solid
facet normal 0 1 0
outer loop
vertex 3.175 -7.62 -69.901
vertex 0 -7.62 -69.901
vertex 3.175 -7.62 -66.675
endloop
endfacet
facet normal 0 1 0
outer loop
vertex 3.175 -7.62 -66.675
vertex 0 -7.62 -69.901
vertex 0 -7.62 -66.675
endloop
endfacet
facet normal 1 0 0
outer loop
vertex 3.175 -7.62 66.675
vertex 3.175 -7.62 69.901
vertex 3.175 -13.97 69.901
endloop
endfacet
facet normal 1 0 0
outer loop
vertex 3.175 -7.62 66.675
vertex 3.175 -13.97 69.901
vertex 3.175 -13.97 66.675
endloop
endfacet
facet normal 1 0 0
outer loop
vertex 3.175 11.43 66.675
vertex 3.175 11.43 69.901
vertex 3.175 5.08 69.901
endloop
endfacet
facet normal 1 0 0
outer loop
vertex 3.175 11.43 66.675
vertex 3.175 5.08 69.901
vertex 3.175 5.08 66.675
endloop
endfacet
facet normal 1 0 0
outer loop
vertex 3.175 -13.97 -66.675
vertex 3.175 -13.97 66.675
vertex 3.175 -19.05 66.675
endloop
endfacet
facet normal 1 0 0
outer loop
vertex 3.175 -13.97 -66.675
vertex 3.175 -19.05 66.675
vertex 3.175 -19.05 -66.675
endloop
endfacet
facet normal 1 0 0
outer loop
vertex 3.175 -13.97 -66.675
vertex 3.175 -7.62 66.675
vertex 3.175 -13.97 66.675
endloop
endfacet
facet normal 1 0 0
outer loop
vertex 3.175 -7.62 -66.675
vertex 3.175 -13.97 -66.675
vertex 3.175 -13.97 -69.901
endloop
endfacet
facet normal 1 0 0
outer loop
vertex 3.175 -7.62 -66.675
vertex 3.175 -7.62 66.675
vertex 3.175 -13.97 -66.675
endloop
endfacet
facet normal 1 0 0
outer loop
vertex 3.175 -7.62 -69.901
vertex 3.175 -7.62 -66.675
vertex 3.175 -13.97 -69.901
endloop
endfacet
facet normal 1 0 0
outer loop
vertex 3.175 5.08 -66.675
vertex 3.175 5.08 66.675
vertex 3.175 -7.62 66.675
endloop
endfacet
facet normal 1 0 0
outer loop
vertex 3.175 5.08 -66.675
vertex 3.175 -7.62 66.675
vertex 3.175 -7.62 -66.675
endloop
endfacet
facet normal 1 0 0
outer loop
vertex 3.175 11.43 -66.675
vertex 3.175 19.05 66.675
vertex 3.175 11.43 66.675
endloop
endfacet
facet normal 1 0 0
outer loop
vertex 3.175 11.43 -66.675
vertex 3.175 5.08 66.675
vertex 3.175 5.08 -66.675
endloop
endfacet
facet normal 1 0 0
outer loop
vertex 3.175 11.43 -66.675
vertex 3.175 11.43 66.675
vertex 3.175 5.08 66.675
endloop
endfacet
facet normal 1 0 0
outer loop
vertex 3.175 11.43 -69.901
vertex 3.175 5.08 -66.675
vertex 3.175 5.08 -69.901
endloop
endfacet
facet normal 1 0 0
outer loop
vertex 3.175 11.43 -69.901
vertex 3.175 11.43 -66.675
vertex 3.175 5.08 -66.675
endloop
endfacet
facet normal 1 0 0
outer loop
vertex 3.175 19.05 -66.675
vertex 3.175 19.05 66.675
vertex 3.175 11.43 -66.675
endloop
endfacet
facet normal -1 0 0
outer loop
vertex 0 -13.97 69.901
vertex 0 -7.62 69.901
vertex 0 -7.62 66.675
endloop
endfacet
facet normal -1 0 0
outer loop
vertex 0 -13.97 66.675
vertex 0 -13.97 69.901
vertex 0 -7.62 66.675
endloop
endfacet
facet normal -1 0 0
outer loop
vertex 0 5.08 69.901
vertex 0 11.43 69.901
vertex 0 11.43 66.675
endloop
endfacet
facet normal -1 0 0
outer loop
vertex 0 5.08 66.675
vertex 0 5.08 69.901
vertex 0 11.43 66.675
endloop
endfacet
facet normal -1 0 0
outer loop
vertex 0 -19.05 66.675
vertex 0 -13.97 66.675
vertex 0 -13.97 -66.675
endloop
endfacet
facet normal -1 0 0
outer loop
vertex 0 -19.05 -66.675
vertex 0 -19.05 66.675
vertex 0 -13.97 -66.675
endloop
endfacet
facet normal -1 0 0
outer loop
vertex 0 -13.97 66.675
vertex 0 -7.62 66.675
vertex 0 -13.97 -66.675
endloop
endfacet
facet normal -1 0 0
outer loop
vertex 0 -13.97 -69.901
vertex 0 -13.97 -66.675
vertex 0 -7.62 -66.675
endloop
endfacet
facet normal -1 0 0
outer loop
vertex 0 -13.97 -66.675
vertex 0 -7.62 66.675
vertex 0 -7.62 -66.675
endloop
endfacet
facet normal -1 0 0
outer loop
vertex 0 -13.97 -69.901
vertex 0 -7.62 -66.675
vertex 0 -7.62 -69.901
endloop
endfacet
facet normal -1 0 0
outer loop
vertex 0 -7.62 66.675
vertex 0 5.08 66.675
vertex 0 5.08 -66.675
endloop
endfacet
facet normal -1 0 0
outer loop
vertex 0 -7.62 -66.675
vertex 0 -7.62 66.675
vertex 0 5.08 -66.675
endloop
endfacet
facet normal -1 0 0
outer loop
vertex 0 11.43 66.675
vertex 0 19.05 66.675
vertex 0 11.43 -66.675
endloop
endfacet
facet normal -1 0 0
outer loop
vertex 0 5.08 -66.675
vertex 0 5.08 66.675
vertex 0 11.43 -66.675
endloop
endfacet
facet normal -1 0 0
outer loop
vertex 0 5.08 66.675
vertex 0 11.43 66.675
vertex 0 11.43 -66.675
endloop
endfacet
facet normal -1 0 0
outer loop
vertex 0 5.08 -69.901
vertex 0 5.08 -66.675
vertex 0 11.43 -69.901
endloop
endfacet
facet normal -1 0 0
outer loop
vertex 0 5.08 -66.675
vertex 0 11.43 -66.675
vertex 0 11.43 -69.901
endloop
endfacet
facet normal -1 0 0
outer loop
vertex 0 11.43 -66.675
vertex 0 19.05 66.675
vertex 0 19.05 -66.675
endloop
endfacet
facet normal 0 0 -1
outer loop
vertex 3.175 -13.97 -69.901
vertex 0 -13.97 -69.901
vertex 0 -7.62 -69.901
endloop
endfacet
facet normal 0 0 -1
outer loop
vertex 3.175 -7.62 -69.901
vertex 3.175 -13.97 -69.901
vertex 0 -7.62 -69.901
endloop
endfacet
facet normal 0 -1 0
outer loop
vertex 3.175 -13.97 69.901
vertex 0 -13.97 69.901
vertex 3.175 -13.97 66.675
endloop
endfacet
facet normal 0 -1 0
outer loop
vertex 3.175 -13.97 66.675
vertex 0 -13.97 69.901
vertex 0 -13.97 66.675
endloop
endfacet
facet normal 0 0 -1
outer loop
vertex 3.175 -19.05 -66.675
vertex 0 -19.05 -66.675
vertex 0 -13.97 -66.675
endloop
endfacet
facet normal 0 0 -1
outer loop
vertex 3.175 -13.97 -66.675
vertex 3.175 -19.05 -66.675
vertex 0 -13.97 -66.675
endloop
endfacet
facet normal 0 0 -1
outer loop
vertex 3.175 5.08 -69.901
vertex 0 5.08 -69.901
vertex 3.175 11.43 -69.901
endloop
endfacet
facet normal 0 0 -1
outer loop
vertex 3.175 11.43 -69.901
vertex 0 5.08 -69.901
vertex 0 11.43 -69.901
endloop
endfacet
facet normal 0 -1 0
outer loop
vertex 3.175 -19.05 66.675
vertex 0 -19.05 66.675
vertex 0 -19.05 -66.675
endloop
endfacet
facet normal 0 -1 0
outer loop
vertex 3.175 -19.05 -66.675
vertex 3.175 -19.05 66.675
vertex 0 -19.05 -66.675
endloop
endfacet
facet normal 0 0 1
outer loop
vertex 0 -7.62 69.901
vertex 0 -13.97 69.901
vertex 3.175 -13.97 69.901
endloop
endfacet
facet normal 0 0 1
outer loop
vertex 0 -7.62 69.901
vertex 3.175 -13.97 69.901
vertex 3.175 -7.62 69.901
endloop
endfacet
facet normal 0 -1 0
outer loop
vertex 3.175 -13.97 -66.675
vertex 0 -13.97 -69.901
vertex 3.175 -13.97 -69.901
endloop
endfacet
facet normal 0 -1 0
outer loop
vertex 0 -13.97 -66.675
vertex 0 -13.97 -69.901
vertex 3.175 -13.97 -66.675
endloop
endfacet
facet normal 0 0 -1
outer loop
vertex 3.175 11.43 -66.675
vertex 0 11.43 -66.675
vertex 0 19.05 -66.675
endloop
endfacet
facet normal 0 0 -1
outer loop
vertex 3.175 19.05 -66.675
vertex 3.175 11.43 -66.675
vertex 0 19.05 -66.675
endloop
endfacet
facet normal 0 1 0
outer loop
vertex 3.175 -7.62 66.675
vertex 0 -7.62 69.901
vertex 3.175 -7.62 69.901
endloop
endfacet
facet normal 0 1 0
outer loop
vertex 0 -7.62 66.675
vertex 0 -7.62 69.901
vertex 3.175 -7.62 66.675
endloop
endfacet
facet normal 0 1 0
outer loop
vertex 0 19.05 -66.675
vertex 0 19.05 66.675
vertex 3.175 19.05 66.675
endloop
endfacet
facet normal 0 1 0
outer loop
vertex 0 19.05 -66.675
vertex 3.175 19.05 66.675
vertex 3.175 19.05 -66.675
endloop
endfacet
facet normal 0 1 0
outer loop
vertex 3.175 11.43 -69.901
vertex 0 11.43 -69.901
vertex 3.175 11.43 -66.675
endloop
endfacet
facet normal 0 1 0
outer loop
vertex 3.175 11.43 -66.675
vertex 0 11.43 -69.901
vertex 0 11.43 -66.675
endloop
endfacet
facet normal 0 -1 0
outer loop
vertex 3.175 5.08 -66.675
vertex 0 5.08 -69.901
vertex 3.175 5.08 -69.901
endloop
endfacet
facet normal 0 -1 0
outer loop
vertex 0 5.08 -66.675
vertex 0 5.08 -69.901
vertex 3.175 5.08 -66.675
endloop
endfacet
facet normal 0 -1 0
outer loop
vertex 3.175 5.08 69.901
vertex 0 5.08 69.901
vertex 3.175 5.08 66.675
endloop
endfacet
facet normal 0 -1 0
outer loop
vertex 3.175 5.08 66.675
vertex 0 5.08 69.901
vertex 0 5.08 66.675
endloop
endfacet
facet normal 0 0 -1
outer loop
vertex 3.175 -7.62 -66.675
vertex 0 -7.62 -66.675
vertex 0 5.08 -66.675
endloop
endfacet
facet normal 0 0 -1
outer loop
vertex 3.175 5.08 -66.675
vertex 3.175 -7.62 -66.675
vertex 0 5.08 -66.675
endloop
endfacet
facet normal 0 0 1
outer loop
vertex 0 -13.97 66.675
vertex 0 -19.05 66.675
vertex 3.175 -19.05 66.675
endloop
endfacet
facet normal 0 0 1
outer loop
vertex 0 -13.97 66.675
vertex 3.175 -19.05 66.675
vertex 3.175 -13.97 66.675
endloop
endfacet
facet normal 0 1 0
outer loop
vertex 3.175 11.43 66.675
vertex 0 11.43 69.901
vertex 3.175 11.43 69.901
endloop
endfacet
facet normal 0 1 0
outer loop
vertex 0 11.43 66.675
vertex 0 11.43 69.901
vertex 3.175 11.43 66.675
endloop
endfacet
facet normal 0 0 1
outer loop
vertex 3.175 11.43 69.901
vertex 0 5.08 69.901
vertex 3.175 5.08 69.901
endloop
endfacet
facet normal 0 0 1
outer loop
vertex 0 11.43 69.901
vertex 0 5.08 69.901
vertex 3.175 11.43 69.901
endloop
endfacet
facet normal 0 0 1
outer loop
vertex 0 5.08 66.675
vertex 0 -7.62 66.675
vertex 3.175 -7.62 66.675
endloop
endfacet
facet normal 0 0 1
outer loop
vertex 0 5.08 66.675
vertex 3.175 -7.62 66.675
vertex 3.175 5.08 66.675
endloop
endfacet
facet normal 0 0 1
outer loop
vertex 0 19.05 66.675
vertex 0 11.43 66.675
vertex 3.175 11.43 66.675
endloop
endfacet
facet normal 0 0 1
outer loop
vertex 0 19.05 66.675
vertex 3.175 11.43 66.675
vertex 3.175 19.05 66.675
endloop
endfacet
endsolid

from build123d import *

# Parameters (mm, degrees)
SKETCH1_W           = 133.35
SKETCH1_H           = 38.1
BOSS_EXTRUDE1_DEPTH = 3.175
SKETCH2_W           = 3.2258
SKETCH2_H           = 6.35
BOSS_EXTRUDE2_DEPTH = 3.175


with BuildPart() as part:
    # Sketch1 → Boss-Extrude1 (new body)
    with BuildSketch(Plane(origin=(0, 0, 0), x_dir=(0, 0, -1), z_dir=(1, 0, 0))):
        Rectangle(SKETCH1_W, SKETCH1_H)
    extrude(amount=BOSS_EXTRUDE1_DEPTH)

    # Sketch2 → Boss-Extrude2 (add)
    with BuildSketch(Plane.ZY):
        with Locations((-68.2879, 8.255)):
            Rectangle(SKETCH2_W, SKETCH2_H)
        with Locations((-68.2879, -10.795)):
            Rectangle(SKETCH2_W, SKETCH2_H)
    boss_extrude2 = extrude(amount=-BOSS_EXTRUDE2_DEPTH)

    # Mirror1: Boss-Extrude2 across plane
    add(boss_extrude2.mirror(Plane.XY))


solid = part.part
